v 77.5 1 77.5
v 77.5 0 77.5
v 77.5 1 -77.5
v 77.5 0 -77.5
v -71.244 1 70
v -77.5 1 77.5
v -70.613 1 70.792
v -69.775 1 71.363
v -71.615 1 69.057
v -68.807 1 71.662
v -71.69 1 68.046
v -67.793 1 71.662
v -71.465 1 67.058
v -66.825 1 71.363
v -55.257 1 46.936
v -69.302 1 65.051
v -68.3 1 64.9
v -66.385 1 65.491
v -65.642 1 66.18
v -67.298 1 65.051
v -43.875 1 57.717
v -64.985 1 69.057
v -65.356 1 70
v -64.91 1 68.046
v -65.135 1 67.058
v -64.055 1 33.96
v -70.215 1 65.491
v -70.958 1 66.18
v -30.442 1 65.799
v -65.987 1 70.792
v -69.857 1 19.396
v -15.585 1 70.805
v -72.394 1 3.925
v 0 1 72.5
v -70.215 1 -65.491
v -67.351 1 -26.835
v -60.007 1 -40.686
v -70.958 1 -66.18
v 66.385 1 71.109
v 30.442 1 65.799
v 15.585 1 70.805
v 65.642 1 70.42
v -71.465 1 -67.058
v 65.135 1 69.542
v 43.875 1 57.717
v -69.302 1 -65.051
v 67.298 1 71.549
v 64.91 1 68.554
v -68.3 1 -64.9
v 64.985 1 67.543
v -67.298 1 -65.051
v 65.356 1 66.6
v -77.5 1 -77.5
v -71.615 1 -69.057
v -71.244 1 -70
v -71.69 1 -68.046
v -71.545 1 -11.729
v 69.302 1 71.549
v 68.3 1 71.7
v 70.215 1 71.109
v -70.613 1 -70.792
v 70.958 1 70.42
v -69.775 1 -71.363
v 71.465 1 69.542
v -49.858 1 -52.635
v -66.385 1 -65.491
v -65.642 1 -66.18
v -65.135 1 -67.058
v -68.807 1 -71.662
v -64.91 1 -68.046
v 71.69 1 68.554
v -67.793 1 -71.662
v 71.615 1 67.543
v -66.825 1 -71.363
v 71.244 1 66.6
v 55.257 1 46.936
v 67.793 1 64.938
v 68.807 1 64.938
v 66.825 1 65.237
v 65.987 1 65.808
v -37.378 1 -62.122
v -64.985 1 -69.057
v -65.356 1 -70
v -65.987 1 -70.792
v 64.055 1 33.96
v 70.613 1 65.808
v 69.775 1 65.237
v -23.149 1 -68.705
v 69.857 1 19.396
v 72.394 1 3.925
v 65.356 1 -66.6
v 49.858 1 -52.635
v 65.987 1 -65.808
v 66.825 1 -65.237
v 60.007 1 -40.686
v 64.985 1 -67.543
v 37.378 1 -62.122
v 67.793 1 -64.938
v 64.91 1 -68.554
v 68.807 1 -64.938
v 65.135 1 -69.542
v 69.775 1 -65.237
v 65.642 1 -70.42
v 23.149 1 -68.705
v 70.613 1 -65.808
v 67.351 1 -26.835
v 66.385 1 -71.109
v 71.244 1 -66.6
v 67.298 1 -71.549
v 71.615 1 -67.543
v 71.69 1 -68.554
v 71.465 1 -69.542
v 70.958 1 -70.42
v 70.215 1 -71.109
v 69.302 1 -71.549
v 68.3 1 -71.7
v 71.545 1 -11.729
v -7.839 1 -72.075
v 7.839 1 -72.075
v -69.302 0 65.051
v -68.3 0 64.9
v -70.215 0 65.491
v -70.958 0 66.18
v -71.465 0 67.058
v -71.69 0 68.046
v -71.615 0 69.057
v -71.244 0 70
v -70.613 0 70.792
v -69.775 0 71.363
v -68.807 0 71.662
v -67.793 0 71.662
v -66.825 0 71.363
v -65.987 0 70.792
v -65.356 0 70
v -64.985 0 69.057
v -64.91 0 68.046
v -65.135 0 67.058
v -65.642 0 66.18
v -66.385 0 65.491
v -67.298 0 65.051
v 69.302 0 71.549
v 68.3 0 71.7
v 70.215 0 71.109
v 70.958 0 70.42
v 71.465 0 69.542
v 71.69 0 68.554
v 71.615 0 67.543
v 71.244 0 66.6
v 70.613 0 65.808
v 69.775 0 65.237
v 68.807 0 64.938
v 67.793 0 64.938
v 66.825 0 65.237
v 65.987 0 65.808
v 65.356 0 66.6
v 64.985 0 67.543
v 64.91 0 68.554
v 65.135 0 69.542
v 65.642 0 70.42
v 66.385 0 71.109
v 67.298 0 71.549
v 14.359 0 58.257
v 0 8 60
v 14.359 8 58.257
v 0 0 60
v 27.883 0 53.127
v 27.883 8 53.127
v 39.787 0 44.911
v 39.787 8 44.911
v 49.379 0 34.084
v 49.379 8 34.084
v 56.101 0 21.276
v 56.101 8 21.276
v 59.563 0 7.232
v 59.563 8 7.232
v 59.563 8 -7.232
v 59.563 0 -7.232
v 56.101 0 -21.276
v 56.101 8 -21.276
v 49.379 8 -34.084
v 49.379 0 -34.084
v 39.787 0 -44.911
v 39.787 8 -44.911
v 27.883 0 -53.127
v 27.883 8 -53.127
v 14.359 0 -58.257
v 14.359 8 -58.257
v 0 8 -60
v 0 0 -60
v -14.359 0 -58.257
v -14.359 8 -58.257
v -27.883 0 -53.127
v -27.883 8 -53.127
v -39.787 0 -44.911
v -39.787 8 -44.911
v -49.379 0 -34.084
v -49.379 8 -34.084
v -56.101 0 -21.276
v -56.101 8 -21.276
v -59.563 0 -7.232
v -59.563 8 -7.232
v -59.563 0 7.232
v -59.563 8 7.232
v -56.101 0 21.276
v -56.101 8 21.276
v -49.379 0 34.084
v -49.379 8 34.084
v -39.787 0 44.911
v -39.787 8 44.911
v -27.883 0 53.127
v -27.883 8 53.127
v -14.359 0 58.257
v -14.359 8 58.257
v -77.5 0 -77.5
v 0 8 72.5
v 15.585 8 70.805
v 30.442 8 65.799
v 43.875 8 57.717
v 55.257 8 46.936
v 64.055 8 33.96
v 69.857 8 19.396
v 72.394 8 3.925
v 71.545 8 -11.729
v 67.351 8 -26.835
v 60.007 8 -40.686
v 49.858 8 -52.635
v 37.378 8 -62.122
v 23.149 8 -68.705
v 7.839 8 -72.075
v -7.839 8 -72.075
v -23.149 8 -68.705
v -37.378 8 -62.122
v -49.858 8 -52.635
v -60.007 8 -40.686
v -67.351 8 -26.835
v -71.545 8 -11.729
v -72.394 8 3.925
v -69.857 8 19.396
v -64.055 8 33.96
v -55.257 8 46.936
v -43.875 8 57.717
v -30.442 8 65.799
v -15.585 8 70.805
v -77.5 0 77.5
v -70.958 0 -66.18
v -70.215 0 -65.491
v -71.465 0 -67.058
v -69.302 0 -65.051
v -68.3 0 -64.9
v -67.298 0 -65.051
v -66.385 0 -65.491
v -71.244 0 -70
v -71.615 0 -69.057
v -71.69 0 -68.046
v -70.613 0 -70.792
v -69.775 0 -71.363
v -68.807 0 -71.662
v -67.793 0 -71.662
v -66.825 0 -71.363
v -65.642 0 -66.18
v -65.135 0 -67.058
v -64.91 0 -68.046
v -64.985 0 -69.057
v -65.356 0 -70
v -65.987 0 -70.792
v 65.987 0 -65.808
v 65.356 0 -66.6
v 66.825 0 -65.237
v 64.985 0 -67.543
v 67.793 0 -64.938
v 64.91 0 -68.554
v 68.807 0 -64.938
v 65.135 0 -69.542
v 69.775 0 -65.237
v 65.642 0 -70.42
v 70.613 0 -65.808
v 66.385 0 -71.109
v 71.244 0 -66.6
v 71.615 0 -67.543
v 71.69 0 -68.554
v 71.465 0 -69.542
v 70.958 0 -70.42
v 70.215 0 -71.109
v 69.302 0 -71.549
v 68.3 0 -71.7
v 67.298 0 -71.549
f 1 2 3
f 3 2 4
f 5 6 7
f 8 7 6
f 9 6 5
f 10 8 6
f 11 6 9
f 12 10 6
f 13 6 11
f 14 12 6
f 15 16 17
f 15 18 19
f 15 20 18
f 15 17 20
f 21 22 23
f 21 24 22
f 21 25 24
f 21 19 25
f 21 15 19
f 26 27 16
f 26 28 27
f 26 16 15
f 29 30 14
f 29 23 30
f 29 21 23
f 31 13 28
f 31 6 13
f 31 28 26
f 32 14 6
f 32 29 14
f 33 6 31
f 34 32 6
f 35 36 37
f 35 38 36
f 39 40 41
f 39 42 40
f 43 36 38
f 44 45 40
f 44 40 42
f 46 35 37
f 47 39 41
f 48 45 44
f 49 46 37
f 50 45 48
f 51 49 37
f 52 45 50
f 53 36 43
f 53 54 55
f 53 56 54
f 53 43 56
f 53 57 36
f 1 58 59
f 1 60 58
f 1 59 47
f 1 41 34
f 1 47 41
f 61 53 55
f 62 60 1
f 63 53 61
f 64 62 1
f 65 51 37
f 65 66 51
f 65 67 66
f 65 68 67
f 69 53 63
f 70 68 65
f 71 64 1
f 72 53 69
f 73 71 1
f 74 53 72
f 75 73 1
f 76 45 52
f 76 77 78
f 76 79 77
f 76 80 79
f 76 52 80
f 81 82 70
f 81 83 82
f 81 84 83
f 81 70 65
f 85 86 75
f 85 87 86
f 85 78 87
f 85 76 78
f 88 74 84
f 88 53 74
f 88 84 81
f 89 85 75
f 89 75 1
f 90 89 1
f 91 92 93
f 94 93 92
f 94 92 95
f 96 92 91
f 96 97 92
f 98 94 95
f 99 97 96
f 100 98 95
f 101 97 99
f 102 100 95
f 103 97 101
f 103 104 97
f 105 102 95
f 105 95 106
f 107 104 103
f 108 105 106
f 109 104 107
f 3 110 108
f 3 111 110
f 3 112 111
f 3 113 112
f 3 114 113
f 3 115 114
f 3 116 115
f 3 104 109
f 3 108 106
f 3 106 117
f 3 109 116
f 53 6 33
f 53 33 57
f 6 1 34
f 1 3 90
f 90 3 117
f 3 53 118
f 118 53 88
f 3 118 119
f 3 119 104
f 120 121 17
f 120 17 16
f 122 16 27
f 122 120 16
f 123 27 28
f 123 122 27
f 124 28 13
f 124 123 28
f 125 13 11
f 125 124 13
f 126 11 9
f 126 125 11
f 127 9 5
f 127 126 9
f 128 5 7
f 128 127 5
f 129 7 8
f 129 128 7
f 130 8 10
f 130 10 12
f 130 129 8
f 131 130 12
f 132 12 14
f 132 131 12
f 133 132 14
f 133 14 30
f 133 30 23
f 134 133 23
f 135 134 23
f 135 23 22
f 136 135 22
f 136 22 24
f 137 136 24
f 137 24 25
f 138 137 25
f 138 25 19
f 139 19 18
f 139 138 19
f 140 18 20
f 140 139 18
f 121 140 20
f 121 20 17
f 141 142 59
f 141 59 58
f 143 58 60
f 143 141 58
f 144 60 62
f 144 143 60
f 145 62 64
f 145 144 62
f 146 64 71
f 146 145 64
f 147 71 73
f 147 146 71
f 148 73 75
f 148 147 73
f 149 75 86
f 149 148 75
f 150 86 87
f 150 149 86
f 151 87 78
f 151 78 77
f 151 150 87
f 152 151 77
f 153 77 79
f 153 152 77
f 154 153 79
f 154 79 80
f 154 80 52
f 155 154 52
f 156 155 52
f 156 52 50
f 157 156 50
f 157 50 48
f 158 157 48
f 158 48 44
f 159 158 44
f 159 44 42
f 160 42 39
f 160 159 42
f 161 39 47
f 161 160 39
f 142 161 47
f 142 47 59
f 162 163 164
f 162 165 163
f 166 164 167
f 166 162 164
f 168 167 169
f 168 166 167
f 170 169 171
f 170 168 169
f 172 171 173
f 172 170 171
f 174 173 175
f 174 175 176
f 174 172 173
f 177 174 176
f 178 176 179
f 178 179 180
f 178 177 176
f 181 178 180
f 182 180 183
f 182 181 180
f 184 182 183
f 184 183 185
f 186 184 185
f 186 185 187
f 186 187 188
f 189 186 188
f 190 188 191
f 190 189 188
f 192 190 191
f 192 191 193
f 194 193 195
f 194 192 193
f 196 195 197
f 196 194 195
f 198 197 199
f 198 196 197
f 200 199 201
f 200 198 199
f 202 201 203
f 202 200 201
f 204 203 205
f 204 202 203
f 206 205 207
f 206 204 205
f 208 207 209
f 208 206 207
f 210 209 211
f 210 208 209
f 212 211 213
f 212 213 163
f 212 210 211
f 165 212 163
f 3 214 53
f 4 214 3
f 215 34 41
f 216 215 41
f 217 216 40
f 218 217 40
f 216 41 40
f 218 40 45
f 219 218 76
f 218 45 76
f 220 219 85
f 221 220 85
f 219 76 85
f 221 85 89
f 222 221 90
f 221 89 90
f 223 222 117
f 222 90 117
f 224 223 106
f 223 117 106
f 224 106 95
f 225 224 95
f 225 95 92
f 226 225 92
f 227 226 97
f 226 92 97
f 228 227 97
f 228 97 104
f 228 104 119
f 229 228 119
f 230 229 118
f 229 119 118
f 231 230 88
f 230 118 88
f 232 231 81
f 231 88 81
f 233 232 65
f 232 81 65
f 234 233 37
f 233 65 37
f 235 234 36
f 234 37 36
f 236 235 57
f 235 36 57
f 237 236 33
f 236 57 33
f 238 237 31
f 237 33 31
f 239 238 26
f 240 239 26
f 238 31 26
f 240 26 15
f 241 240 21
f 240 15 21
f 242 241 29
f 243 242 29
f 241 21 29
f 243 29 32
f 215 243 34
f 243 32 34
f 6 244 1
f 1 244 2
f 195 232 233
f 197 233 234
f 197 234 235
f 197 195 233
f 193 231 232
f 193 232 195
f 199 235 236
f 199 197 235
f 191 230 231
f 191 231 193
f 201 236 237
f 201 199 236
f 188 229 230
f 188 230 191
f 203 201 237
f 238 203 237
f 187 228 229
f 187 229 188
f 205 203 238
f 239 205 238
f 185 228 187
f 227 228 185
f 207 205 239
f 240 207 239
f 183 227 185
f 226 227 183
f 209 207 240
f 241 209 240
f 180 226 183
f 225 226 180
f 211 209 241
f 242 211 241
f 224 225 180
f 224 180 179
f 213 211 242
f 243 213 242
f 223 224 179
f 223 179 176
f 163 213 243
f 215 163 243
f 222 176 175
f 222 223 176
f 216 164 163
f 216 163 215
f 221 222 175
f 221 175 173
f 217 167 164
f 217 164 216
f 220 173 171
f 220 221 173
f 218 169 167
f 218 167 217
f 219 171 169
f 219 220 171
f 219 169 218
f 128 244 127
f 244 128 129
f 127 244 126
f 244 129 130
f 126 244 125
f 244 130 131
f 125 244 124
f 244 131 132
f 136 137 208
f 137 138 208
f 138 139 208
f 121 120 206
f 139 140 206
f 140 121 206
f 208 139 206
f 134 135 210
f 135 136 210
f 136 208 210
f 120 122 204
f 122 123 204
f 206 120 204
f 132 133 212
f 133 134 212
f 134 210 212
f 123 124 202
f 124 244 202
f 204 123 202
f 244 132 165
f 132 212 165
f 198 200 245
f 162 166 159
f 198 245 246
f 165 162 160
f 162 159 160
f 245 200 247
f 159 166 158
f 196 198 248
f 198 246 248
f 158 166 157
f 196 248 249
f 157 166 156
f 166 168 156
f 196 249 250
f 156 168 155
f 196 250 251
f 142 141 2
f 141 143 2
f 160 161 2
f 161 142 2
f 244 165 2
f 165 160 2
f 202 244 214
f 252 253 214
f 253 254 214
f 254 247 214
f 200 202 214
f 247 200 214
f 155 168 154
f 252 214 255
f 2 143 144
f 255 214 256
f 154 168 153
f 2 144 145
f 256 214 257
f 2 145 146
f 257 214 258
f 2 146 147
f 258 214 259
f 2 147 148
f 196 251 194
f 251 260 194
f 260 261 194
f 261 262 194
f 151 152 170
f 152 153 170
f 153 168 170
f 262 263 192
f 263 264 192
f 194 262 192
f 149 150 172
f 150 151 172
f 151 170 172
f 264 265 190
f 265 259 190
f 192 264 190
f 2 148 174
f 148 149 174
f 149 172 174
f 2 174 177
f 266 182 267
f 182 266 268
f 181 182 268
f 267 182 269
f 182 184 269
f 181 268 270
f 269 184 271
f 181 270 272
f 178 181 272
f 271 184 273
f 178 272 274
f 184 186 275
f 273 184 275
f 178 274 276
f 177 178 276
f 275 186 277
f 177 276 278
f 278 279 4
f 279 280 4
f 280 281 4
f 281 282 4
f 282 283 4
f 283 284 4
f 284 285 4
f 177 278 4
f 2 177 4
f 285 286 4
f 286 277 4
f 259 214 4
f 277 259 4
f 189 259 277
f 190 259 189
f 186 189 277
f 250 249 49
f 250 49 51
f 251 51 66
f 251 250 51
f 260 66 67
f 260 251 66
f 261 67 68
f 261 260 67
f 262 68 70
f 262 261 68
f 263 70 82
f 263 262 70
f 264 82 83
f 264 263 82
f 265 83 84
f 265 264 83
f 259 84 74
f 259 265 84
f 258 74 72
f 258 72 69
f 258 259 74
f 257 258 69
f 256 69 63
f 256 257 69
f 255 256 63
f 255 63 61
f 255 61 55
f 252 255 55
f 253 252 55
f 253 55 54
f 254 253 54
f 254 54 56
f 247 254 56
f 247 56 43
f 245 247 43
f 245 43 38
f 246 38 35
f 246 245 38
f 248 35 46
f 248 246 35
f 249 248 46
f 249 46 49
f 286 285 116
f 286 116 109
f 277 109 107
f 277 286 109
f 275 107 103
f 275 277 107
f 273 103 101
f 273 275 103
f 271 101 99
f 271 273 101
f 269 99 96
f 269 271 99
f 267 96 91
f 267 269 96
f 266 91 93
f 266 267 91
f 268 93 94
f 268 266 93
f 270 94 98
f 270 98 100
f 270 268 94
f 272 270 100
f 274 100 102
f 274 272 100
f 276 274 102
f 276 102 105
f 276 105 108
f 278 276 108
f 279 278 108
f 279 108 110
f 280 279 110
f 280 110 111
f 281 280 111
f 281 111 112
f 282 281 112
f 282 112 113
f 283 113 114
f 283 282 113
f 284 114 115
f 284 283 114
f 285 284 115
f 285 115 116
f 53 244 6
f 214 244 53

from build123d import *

# Parameters (mm, degrees)
SKETCH1_W           = 155
SKETCH1_H           = 155
SKETCH1_R           = 60
SKETCH1_R_2         = 3.4
BOSS_EXTRUDE1_DEPTH = 1
SKETCH2_R           = 72.5
SKETCH2_R_2         = 60
BOSS_EXTRUDE2_DEPTH = 7


with BuildPart() as part:
    # Sketch1 → Boss-Extrude1 (new body)
    with BuildSketch(Plane(origin=(0, 0, 0), x_dir=(1, 0, 0), z_dir=(0, 1, 0))):
        Rectangle(SKETCH1_W, SKETCH1_H)
        with Locations(Location((0, 0, 0), (0, 0, 270))):
            Circle(SKETCH1_R, mode=Mode.SUBTRACT)
        with Locations(Location((-68.3, 68.3, 0), (0, 0, 270))):
            Circle(SKETCH1_R_2, mode=Mode.SUBTRACT)
        with Locations(Location((68.3, 68.3, 0), (0, 0, 90))):
            Circle(SKETCH1_R_2, mode=Mode.SUBTRACT)
        with Locations(Location((-68.3, -68.3, 0), (0, 0, 90))):
            Circle(SKETCH1_R_2, mode=Mode.SUBTRACT)
        with Locations(Location((68.3, -68.3, 0), (0, 0, 270))):
            Circle(SKETCH1_R_2, mode=Mode.SUBTRACT)
    extrude(amount=BOSS_EXTRUDE1_DEPTH)

    # Sketch2 → Boss-Extrude2 (add)
    with BuildSketch(Plane(origin=(0, 1, 0), x_dir=(1, 0, 0), z_dir=(0, 1, 0))):
        with Locations(Location((0, 0, 0), (0, 0, 270))):
            Circle(SKETCH2_R)
        with Locations(Location((0, 0, 0), (0, 0, 270))):
            Circle(SKETCH2_R_2, mode=Mode.SUBTRACT)
    extrude(amount=BOSS_EXTRUDE2_DEPTH)


solid = part.part
